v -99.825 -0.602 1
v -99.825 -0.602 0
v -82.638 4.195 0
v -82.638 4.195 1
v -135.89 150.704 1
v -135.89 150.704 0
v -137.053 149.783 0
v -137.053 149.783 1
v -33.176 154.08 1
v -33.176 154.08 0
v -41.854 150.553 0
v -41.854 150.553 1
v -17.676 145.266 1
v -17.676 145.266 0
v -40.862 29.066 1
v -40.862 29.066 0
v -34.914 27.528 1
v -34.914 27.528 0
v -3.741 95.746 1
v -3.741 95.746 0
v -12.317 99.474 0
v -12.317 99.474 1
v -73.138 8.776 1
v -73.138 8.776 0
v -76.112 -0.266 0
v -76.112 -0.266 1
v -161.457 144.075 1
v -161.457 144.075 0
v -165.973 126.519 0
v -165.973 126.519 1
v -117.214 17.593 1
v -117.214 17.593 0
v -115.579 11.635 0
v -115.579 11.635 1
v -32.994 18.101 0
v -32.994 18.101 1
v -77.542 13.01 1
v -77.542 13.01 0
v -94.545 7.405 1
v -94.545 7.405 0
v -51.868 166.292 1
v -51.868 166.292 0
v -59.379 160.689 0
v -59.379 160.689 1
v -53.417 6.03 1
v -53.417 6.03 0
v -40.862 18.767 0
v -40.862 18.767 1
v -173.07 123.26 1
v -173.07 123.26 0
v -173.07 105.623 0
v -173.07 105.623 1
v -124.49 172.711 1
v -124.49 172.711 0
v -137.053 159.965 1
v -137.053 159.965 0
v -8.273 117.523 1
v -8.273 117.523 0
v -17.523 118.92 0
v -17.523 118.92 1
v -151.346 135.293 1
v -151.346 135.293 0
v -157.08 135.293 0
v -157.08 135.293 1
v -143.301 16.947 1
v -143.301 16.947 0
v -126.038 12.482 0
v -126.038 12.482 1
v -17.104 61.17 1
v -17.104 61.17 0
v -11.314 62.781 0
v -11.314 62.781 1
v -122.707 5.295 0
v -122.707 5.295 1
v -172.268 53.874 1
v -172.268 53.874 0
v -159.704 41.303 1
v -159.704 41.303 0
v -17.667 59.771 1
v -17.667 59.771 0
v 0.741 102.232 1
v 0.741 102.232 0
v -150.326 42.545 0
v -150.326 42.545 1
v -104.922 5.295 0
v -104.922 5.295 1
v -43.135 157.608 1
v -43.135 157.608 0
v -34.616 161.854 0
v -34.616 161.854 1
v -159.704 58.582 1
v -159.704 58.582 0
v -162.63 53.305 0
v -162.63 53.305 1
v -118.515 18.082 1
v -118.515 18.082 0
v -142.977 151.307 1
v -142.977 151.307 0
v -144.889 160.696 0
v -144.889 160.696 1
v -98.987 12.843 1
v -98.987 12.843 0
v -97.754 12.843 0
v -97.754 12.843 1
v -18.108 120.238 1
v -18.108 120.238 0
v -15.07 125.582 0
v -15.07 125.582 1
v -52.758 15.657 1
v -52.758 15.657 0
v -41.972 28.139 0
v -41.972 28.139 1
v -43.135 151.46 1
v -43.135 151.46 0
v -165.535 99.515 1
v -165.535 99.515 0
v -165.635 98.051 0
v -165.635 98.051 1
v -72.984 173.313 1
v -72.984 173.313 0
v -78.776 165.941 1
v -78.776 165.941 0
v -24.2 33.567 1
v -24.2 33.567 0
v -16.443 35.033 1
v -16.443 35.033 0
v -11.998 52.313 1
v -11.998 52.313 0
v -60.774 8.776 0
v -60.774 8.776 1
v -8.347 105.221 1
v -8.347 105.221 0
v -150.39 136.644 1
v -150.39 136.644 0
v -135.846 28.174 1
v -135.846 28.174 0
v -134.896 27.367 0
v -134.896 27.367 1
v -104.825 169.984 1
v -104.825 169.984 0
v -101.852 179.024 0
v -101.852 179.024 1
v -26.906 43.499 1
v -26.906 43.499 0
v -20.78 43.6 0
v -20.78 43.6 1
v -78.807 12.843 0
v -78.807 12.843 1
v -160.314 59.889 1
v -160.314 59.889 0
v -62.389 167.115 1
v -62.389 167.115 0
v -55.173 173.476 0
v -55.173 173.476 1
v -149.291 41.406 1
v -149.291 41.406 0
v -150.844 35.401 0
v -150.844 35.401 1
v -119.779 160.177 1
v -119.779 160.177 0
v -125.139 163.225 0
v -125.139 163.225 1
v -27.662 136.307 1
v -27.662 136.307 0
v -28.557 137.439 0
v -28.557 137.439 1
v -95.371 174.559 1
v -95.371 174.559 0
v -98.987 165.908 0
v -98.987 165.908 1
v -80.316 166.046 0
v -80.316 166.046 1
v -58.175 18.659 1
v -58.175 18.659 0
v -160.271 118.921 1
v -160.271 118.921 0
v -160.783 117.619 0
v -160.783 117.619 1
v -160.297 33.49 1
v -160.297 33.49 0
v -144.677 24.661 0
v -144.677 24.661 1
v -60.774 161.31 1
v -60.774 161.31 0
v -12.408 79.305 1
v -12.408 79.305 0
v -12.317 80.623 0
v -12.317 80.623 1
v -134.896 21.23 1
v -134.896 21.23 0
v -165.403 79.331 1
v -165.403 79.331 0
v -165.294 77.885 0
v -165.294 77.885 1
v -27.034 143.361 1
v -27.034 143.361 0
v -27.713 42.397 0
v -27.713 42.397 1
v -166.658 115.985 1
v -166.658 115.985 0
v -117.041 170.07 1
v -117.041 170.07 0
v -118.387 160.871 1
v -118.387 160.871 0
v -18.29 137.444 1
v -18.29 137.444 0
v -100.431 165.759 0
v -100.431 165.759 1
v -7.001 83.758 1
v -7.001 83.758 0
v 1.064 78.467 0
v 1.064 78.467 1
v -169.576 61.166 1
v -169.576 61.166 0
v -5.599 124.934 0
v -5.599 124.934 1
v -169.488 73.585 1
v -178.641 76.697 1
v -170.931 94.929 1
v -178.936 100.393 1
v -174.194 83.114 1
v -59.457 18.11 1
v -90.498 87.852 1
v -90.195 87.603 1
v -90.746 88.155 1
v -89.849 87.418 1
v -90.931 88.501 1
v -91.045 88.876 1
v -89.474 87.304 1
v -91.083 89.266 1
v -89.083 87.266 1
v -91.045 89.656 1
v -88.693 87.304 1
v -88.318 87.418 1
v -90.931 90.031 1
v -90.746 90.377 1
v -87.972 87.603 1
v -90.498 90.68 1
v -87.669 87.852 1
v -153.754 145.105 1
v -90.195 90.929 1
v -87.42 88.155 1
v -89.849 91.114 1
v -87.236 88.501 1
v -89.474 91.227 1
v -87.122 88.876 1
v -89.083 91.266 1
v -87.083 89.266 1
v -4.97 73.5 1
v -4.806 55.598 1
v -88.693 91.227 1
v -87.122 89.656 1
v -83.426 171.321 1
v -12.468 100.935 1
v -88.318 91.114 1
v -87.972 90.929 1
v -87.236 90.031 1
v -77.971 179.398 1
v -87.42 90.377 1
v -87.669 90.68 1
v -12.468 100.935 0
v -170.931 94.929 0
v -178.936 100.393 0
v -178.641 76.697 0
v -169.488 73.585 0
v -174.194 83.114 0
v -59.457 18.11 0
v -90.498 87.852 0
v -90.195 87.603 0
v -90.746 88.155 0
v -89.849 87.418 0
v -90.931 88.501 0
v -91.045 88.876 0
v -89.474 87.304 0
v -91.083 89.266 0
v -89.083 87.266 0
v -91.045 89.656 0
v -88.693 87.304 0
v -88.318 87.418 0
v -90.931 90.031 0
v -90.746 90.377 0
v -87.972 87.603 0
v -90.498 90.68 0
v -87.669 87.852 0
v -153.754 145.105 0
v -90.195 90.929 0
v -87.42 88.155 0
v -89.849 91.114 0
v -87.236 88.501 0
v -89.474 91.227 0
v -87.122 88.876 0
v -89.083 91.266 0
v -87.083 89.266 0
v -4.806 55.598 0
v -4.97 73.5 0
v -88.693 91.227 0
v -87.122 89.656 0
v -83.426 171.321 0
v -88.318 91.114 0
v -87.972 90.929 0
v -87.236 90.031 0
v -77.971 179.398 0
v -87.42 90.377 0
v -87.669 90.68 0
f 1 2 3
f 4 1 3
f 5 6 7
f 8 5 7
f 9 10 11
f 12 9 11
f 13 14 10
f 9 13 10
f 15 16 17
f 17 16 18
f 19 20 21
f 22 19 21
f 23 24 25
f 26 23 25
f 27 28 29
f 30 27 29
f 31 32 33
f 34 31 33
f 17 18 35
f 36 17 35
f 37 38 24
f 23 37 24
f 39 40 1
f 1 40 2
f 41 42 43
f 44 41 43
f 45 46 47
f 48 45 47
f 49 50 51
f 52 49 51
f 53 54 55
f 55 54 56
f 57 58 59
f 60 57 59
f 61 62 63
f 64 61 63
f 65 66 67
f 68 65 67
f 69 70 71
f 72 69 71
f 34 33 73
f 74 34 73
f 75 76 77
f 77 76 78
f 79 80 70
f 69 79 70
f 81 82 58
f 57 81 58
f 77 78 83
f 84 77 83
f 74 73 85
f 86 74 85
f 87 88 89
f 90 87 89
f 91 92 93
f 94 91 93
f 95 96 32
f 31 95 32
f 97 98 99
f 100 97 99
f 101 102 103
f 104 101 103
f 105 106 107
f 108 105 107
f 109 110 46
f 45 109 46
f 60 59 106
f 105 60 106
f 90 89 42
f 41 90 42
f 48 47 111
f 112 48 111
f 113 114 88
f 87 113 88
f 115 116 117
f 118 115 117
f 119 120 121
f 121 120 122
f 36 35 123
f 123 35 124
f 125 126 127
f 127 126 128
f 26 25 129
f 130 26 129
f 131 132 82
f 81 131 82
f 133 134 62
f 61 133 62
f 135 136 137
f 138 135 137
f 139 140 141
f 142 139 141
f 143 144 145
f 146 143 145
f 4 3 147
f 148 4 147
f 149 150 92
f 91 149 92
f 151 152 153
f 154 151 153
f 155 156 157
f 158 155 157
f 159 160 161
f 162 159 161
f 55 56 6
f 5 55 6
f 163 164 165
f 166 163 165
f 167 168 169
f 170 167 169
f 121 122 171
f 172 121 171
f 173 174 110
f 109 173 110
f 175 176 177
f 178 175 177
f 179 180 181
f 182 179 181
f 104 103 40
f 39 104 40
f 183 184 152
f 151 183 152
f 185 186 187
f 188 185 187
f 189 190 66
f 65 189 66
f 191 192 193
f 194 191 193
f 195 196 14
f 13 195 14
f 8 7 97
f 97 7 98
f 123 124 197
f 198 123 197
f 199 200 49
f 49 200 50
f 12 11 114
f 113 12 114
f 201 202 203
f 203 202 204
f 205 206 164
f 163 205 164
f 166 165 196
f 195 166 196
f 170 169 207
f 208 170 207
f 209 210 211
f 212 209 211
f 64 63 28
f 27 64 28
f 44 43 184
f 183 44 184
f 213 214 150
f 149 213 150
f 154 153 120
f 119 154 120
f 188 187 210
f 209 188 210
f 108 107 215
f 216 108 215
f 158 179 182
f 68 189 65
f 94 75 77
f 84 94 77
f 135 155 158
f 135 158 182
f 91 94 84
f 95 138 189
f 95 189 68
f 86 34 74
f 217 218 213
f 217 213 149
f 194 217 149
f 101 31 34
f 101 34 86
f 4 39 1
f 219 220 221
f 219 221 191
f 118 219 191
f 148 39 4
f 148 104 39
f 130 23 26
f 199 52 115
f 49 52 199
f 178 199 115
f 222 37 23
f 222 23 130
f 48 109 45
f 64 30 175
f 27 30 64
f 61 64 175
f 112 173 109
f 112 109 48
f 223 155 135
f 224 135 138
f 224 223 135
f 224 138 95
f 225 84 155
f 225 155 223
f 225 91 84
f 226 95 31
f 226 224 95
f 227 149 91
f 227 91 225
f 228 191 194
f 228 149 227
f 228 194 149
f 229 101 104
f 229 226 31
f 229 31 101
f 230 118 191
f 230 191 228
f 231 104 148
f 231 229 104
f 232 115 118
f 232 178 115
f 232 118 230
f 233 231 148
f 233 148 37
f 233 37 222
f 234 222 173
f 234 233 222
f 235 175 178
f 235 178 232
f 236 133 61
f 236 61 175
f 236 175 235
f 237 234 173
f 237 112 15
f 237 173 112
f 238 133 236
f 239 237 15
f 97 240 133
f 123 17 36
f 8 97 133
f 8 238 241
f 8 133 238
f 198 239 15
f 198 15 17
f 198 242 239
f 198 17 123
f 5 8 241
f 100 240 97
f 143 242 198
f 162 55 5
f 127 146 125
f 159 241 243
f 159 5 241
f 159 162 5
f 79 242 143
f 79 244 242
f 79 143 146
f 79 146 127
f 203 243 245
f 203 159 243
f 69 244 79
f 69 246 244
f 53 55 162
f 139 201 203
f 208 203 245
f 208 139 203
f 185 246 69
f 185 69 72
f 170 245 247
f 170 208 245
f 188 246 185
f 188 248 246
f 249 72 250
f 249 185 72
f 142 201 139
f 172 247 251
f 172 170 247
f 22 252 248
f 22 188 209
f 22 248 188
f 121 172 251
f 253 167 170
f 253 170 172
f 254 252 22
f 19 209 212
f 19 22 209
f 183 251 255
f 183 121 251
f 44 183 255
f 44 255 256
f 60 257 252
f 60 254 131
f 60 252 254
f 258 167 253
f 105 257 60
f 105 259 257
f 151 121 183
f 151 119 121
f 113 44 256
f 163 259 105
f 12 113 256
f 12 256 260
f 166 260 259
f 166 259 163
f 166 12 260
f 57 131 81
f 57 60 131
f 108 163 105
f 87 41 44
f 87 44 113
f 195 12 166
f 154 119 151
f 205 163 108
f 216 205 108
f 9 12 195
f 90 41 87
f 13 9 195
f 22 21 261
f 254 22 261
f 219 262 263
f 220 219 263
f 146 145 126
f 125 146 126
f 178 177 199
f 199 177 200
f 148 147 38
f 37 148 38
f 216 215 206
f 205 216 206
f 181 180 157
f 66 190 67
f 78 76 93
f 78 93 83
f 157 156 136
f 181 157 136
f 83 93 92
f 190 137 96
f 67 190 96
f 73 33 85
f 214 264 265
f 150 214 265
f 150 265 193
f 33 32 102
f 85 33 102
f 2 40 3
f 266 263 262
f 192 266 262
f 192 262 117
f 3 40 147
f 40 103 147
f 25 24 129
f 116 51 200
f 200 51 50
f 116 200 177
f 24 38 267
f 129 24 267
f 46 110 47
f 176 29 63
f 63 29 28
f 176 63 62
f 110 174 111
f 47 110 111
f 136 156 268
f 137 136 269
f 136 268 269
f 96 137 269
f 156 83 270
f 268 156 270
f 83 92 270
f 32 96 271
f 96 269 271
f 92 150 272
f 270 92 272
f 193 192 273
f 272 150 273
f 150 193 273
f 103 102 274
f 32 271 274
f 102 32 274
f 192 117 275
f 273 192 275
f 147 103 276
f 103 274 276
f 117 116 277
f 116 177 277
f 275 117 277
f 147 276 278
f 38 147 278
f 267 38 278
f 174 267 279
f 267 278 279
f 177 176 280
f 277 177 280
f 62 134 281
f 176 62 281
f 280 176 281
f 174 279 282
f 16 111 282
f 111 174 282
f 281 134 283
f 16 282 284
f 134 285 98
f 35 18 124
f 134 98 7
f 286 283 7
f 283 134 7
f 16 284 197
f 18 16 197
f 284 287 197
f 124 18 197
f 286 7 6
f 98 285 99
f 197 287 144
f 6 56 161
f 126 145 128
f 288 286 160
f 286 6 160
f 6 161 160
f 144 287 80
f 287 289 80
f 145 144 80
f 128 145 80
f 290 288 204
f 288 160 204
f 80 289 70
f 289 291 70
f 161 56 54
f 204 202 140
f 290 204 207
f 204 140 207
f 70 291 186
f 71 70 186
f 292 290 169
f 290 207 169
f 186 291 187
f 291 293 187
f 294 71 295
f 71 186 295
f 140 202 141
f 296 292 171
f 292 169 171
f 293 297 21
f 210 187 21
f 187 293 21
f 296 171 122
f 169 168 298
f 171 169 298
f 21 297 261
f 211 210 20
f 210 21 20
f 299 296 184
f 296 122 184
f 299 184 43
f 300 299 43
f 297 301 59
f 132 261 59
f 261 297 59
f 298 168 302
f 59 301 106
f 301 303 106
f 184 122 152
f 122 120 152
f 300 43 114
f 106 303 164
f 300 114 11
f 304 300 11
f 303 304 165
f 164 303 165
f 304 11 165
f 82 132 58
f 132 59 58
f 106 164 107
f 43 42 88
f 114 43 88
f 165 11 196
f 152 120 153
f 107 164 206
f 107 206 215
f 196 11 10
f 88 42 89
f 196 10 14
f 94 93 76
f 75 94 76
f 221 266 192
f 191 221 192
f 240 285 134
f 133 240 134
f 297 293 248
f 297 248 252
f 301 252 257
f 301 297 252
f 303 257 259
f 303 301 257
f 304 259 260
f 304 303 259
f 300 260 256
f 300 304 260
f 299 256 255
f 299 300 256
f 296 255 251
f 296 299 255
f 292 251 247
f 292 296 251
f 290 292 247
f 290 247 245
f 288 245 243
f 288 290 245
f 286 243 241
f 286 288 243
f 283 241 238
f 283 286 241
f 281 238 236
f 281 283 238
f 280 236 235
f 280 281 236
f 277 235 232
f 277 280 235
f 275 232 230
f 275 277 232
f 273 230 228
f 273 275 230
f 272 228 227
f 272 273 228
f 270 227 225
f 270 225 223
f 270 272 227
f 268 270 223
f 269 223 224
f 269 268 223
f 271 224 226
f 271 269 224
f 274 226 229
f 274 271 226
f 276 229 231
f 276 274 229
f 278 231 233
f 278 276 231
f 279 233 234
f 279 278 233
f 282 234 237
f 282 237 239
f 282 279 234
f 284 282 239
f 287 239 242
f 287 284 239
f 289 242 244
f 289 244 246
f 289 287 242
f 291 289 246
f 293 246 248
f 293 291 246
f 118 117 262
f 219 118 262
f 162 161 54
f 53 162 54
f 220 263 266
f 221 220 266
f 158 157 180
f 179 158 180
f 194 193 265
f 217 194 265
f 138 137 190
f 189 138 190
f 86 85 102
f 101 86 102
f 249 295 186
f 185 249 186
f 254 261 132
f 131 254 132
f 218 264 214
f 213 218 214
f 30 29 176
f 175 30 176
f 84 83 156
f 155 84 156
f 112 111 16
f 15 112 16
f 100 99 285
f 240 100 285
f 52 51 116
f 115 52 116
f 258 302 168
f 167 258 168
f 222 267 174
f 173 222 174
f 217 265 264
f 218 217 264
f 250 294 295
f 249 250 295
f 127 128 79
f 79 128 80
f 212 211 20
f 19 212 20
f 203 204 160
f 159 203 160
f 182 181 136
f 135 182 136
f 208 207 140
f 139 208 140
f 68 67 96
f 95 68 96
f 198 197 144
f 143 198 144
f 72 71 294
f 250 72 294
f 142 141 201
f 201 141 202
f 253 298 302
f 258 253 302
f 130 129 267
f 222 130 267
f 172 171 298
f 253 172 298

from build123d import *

# Parameters (mm, degrees)
F0_R     = 2
F1_DEPTH = 1


with BuildPart() as f1:
    # F0 (on Top) → F1 (new body)
    with BuildSketch(Plane.XY):
        Polygon((-170.931182, 94.929279), (-178.935592, 100.393385), (-174.19368, 83.114073), (-165.403008, 79.330623), (-165.294349, 77.884942), (-169.487819, 73.585391), (-178.64053, 76.696806), (-169.576123, 61.166067), (-160.313651, 59.888694), (-159.703866, 58.582332), (-162.630156, 53.304747), (-172.268271, 53.874396), (-159.703866, 41.302852), (-150.326058, 42.545263), (-149.290547, 41.406386), (-150.843814, 35.401404), (-160.297245, 33.490323), (-144.676849, 24.660785), (-135.845885, 28.173612), (-134.896323, 27.366612), (-134.896323, 21.229759), (-143.300653, 16.94699), (-126.037876, 12.481747), (-118.515134, 18.081743), (-117.21383, 17.592588), (-115.578801, 11.634614), (-122.706801, 5.295417), (-104.921646, 5.295417), (-98.986857, 12.843247), (-97.754188, 12.843247), (-94.544627, 7.404838), (-99.824868, -0.601654), (-82.638197, 4.195278), (-78.807436, 12.843247), (-77.541642, 13.009544), (-73.138356, 8.775612), (-76.111726, -0.265788), (-60.774289, 8.775612), (-59.456516, 18.109852), (-58.175348, 18.658925), (-52.757829, 15.657326), (-53.416714, 6.030248), (-40.861767, 18.76732), (-41.971847, 28.13928), (-40.861767, 29.065885), (-34.913585, 27.52826), (-32.994203, 18.100707), (-24.199748, 33.567108), (-27.712576, 42.396642), (-26.905576, 43.499492), (-20.779634, 43.600194), (-16.44348, 35.033159), (-11.998242, 52.313395), (-17.667146, 59.771266), (-17.104328, 61.170273), (-11.314055, 62.781483), (-4.805986, 55.59827), (-4.969601, 73.500365), (-12.407549, 79.304725), (-12.317293, 80.623472), (-7.000638, 83.757633), (1.064408, 78.466788), (-3.74119, 95.745668), (-12.317293, 99.474117), (-12.467637, 100.935459), (-8.347162, 105.220751), (0.74094, 102.232022), (-8.272784, 117.522509), (-17.522758, 118.920013), (-18.108435, 120.23779), (-15.069733, 125.581815), (-5.598881, 124.933623), (-18.290413, 137.443681), (-27.662303, 136.307329), (-28.557425, 137.438729), (-27.033923, 143.36113), (-17.676375, 145.266259), (-33.176269, 154.079758), (-41.853711, 150.553182), (-43.134663, 151.459798), (-43.134663, 157.608002), (-34.616161, 161.854208), (-51.867886, 166.292111), (-59.378833, 160.689354), (-60.774289, 161.31033), (-62.388756, 167.115263), (-55.173125, 173.475817), (-72.983663, 173.313039), (-78.776218, 165.940508), (-80.316429, 166.045921), (-83.425997, 171.320856), (-77.970915, 179.398346), (-95.370838, 174.559084), (-98.986857, 165.907577), (-100.430792, 165.759024), (-104.825104, 169.984327), (-101.852417, 179.02365), (-117.040908, 170.070053), (-118.387379, 160.870731), (-119.778854, 160.177124), (-125.139098, 163.225048), (-124.489884, 172.71082), (-137.053189, 159.965269), (-135.889679, 150.703996), (-137.053189, 149.78347), (-142.977322, 151.307418), (-144.888788, 160.696093), (-153.754356, 145.104628), (-150.389701, 136.644378), (-151.345882, 135.293397), (-157.080024, 135.293397), (-161.457264, 144.074773), (-165.973303, 126.519309), (-160.271138, 118.921481), (-160.782874, 117.619239), (-166.658001, 115.98525), (-173.070462, 123.259766), (-173.070462, 105.623409), (-165.534943, 99.514894), (-165.635112, 98.051306), align=None)
        with Locations((-89.083396, 89.265883)):
            Circle(F0_R, mode=Mode.SUBTRACT)
    extrude(amount=F1_DEPTH)


solid = f1.part
